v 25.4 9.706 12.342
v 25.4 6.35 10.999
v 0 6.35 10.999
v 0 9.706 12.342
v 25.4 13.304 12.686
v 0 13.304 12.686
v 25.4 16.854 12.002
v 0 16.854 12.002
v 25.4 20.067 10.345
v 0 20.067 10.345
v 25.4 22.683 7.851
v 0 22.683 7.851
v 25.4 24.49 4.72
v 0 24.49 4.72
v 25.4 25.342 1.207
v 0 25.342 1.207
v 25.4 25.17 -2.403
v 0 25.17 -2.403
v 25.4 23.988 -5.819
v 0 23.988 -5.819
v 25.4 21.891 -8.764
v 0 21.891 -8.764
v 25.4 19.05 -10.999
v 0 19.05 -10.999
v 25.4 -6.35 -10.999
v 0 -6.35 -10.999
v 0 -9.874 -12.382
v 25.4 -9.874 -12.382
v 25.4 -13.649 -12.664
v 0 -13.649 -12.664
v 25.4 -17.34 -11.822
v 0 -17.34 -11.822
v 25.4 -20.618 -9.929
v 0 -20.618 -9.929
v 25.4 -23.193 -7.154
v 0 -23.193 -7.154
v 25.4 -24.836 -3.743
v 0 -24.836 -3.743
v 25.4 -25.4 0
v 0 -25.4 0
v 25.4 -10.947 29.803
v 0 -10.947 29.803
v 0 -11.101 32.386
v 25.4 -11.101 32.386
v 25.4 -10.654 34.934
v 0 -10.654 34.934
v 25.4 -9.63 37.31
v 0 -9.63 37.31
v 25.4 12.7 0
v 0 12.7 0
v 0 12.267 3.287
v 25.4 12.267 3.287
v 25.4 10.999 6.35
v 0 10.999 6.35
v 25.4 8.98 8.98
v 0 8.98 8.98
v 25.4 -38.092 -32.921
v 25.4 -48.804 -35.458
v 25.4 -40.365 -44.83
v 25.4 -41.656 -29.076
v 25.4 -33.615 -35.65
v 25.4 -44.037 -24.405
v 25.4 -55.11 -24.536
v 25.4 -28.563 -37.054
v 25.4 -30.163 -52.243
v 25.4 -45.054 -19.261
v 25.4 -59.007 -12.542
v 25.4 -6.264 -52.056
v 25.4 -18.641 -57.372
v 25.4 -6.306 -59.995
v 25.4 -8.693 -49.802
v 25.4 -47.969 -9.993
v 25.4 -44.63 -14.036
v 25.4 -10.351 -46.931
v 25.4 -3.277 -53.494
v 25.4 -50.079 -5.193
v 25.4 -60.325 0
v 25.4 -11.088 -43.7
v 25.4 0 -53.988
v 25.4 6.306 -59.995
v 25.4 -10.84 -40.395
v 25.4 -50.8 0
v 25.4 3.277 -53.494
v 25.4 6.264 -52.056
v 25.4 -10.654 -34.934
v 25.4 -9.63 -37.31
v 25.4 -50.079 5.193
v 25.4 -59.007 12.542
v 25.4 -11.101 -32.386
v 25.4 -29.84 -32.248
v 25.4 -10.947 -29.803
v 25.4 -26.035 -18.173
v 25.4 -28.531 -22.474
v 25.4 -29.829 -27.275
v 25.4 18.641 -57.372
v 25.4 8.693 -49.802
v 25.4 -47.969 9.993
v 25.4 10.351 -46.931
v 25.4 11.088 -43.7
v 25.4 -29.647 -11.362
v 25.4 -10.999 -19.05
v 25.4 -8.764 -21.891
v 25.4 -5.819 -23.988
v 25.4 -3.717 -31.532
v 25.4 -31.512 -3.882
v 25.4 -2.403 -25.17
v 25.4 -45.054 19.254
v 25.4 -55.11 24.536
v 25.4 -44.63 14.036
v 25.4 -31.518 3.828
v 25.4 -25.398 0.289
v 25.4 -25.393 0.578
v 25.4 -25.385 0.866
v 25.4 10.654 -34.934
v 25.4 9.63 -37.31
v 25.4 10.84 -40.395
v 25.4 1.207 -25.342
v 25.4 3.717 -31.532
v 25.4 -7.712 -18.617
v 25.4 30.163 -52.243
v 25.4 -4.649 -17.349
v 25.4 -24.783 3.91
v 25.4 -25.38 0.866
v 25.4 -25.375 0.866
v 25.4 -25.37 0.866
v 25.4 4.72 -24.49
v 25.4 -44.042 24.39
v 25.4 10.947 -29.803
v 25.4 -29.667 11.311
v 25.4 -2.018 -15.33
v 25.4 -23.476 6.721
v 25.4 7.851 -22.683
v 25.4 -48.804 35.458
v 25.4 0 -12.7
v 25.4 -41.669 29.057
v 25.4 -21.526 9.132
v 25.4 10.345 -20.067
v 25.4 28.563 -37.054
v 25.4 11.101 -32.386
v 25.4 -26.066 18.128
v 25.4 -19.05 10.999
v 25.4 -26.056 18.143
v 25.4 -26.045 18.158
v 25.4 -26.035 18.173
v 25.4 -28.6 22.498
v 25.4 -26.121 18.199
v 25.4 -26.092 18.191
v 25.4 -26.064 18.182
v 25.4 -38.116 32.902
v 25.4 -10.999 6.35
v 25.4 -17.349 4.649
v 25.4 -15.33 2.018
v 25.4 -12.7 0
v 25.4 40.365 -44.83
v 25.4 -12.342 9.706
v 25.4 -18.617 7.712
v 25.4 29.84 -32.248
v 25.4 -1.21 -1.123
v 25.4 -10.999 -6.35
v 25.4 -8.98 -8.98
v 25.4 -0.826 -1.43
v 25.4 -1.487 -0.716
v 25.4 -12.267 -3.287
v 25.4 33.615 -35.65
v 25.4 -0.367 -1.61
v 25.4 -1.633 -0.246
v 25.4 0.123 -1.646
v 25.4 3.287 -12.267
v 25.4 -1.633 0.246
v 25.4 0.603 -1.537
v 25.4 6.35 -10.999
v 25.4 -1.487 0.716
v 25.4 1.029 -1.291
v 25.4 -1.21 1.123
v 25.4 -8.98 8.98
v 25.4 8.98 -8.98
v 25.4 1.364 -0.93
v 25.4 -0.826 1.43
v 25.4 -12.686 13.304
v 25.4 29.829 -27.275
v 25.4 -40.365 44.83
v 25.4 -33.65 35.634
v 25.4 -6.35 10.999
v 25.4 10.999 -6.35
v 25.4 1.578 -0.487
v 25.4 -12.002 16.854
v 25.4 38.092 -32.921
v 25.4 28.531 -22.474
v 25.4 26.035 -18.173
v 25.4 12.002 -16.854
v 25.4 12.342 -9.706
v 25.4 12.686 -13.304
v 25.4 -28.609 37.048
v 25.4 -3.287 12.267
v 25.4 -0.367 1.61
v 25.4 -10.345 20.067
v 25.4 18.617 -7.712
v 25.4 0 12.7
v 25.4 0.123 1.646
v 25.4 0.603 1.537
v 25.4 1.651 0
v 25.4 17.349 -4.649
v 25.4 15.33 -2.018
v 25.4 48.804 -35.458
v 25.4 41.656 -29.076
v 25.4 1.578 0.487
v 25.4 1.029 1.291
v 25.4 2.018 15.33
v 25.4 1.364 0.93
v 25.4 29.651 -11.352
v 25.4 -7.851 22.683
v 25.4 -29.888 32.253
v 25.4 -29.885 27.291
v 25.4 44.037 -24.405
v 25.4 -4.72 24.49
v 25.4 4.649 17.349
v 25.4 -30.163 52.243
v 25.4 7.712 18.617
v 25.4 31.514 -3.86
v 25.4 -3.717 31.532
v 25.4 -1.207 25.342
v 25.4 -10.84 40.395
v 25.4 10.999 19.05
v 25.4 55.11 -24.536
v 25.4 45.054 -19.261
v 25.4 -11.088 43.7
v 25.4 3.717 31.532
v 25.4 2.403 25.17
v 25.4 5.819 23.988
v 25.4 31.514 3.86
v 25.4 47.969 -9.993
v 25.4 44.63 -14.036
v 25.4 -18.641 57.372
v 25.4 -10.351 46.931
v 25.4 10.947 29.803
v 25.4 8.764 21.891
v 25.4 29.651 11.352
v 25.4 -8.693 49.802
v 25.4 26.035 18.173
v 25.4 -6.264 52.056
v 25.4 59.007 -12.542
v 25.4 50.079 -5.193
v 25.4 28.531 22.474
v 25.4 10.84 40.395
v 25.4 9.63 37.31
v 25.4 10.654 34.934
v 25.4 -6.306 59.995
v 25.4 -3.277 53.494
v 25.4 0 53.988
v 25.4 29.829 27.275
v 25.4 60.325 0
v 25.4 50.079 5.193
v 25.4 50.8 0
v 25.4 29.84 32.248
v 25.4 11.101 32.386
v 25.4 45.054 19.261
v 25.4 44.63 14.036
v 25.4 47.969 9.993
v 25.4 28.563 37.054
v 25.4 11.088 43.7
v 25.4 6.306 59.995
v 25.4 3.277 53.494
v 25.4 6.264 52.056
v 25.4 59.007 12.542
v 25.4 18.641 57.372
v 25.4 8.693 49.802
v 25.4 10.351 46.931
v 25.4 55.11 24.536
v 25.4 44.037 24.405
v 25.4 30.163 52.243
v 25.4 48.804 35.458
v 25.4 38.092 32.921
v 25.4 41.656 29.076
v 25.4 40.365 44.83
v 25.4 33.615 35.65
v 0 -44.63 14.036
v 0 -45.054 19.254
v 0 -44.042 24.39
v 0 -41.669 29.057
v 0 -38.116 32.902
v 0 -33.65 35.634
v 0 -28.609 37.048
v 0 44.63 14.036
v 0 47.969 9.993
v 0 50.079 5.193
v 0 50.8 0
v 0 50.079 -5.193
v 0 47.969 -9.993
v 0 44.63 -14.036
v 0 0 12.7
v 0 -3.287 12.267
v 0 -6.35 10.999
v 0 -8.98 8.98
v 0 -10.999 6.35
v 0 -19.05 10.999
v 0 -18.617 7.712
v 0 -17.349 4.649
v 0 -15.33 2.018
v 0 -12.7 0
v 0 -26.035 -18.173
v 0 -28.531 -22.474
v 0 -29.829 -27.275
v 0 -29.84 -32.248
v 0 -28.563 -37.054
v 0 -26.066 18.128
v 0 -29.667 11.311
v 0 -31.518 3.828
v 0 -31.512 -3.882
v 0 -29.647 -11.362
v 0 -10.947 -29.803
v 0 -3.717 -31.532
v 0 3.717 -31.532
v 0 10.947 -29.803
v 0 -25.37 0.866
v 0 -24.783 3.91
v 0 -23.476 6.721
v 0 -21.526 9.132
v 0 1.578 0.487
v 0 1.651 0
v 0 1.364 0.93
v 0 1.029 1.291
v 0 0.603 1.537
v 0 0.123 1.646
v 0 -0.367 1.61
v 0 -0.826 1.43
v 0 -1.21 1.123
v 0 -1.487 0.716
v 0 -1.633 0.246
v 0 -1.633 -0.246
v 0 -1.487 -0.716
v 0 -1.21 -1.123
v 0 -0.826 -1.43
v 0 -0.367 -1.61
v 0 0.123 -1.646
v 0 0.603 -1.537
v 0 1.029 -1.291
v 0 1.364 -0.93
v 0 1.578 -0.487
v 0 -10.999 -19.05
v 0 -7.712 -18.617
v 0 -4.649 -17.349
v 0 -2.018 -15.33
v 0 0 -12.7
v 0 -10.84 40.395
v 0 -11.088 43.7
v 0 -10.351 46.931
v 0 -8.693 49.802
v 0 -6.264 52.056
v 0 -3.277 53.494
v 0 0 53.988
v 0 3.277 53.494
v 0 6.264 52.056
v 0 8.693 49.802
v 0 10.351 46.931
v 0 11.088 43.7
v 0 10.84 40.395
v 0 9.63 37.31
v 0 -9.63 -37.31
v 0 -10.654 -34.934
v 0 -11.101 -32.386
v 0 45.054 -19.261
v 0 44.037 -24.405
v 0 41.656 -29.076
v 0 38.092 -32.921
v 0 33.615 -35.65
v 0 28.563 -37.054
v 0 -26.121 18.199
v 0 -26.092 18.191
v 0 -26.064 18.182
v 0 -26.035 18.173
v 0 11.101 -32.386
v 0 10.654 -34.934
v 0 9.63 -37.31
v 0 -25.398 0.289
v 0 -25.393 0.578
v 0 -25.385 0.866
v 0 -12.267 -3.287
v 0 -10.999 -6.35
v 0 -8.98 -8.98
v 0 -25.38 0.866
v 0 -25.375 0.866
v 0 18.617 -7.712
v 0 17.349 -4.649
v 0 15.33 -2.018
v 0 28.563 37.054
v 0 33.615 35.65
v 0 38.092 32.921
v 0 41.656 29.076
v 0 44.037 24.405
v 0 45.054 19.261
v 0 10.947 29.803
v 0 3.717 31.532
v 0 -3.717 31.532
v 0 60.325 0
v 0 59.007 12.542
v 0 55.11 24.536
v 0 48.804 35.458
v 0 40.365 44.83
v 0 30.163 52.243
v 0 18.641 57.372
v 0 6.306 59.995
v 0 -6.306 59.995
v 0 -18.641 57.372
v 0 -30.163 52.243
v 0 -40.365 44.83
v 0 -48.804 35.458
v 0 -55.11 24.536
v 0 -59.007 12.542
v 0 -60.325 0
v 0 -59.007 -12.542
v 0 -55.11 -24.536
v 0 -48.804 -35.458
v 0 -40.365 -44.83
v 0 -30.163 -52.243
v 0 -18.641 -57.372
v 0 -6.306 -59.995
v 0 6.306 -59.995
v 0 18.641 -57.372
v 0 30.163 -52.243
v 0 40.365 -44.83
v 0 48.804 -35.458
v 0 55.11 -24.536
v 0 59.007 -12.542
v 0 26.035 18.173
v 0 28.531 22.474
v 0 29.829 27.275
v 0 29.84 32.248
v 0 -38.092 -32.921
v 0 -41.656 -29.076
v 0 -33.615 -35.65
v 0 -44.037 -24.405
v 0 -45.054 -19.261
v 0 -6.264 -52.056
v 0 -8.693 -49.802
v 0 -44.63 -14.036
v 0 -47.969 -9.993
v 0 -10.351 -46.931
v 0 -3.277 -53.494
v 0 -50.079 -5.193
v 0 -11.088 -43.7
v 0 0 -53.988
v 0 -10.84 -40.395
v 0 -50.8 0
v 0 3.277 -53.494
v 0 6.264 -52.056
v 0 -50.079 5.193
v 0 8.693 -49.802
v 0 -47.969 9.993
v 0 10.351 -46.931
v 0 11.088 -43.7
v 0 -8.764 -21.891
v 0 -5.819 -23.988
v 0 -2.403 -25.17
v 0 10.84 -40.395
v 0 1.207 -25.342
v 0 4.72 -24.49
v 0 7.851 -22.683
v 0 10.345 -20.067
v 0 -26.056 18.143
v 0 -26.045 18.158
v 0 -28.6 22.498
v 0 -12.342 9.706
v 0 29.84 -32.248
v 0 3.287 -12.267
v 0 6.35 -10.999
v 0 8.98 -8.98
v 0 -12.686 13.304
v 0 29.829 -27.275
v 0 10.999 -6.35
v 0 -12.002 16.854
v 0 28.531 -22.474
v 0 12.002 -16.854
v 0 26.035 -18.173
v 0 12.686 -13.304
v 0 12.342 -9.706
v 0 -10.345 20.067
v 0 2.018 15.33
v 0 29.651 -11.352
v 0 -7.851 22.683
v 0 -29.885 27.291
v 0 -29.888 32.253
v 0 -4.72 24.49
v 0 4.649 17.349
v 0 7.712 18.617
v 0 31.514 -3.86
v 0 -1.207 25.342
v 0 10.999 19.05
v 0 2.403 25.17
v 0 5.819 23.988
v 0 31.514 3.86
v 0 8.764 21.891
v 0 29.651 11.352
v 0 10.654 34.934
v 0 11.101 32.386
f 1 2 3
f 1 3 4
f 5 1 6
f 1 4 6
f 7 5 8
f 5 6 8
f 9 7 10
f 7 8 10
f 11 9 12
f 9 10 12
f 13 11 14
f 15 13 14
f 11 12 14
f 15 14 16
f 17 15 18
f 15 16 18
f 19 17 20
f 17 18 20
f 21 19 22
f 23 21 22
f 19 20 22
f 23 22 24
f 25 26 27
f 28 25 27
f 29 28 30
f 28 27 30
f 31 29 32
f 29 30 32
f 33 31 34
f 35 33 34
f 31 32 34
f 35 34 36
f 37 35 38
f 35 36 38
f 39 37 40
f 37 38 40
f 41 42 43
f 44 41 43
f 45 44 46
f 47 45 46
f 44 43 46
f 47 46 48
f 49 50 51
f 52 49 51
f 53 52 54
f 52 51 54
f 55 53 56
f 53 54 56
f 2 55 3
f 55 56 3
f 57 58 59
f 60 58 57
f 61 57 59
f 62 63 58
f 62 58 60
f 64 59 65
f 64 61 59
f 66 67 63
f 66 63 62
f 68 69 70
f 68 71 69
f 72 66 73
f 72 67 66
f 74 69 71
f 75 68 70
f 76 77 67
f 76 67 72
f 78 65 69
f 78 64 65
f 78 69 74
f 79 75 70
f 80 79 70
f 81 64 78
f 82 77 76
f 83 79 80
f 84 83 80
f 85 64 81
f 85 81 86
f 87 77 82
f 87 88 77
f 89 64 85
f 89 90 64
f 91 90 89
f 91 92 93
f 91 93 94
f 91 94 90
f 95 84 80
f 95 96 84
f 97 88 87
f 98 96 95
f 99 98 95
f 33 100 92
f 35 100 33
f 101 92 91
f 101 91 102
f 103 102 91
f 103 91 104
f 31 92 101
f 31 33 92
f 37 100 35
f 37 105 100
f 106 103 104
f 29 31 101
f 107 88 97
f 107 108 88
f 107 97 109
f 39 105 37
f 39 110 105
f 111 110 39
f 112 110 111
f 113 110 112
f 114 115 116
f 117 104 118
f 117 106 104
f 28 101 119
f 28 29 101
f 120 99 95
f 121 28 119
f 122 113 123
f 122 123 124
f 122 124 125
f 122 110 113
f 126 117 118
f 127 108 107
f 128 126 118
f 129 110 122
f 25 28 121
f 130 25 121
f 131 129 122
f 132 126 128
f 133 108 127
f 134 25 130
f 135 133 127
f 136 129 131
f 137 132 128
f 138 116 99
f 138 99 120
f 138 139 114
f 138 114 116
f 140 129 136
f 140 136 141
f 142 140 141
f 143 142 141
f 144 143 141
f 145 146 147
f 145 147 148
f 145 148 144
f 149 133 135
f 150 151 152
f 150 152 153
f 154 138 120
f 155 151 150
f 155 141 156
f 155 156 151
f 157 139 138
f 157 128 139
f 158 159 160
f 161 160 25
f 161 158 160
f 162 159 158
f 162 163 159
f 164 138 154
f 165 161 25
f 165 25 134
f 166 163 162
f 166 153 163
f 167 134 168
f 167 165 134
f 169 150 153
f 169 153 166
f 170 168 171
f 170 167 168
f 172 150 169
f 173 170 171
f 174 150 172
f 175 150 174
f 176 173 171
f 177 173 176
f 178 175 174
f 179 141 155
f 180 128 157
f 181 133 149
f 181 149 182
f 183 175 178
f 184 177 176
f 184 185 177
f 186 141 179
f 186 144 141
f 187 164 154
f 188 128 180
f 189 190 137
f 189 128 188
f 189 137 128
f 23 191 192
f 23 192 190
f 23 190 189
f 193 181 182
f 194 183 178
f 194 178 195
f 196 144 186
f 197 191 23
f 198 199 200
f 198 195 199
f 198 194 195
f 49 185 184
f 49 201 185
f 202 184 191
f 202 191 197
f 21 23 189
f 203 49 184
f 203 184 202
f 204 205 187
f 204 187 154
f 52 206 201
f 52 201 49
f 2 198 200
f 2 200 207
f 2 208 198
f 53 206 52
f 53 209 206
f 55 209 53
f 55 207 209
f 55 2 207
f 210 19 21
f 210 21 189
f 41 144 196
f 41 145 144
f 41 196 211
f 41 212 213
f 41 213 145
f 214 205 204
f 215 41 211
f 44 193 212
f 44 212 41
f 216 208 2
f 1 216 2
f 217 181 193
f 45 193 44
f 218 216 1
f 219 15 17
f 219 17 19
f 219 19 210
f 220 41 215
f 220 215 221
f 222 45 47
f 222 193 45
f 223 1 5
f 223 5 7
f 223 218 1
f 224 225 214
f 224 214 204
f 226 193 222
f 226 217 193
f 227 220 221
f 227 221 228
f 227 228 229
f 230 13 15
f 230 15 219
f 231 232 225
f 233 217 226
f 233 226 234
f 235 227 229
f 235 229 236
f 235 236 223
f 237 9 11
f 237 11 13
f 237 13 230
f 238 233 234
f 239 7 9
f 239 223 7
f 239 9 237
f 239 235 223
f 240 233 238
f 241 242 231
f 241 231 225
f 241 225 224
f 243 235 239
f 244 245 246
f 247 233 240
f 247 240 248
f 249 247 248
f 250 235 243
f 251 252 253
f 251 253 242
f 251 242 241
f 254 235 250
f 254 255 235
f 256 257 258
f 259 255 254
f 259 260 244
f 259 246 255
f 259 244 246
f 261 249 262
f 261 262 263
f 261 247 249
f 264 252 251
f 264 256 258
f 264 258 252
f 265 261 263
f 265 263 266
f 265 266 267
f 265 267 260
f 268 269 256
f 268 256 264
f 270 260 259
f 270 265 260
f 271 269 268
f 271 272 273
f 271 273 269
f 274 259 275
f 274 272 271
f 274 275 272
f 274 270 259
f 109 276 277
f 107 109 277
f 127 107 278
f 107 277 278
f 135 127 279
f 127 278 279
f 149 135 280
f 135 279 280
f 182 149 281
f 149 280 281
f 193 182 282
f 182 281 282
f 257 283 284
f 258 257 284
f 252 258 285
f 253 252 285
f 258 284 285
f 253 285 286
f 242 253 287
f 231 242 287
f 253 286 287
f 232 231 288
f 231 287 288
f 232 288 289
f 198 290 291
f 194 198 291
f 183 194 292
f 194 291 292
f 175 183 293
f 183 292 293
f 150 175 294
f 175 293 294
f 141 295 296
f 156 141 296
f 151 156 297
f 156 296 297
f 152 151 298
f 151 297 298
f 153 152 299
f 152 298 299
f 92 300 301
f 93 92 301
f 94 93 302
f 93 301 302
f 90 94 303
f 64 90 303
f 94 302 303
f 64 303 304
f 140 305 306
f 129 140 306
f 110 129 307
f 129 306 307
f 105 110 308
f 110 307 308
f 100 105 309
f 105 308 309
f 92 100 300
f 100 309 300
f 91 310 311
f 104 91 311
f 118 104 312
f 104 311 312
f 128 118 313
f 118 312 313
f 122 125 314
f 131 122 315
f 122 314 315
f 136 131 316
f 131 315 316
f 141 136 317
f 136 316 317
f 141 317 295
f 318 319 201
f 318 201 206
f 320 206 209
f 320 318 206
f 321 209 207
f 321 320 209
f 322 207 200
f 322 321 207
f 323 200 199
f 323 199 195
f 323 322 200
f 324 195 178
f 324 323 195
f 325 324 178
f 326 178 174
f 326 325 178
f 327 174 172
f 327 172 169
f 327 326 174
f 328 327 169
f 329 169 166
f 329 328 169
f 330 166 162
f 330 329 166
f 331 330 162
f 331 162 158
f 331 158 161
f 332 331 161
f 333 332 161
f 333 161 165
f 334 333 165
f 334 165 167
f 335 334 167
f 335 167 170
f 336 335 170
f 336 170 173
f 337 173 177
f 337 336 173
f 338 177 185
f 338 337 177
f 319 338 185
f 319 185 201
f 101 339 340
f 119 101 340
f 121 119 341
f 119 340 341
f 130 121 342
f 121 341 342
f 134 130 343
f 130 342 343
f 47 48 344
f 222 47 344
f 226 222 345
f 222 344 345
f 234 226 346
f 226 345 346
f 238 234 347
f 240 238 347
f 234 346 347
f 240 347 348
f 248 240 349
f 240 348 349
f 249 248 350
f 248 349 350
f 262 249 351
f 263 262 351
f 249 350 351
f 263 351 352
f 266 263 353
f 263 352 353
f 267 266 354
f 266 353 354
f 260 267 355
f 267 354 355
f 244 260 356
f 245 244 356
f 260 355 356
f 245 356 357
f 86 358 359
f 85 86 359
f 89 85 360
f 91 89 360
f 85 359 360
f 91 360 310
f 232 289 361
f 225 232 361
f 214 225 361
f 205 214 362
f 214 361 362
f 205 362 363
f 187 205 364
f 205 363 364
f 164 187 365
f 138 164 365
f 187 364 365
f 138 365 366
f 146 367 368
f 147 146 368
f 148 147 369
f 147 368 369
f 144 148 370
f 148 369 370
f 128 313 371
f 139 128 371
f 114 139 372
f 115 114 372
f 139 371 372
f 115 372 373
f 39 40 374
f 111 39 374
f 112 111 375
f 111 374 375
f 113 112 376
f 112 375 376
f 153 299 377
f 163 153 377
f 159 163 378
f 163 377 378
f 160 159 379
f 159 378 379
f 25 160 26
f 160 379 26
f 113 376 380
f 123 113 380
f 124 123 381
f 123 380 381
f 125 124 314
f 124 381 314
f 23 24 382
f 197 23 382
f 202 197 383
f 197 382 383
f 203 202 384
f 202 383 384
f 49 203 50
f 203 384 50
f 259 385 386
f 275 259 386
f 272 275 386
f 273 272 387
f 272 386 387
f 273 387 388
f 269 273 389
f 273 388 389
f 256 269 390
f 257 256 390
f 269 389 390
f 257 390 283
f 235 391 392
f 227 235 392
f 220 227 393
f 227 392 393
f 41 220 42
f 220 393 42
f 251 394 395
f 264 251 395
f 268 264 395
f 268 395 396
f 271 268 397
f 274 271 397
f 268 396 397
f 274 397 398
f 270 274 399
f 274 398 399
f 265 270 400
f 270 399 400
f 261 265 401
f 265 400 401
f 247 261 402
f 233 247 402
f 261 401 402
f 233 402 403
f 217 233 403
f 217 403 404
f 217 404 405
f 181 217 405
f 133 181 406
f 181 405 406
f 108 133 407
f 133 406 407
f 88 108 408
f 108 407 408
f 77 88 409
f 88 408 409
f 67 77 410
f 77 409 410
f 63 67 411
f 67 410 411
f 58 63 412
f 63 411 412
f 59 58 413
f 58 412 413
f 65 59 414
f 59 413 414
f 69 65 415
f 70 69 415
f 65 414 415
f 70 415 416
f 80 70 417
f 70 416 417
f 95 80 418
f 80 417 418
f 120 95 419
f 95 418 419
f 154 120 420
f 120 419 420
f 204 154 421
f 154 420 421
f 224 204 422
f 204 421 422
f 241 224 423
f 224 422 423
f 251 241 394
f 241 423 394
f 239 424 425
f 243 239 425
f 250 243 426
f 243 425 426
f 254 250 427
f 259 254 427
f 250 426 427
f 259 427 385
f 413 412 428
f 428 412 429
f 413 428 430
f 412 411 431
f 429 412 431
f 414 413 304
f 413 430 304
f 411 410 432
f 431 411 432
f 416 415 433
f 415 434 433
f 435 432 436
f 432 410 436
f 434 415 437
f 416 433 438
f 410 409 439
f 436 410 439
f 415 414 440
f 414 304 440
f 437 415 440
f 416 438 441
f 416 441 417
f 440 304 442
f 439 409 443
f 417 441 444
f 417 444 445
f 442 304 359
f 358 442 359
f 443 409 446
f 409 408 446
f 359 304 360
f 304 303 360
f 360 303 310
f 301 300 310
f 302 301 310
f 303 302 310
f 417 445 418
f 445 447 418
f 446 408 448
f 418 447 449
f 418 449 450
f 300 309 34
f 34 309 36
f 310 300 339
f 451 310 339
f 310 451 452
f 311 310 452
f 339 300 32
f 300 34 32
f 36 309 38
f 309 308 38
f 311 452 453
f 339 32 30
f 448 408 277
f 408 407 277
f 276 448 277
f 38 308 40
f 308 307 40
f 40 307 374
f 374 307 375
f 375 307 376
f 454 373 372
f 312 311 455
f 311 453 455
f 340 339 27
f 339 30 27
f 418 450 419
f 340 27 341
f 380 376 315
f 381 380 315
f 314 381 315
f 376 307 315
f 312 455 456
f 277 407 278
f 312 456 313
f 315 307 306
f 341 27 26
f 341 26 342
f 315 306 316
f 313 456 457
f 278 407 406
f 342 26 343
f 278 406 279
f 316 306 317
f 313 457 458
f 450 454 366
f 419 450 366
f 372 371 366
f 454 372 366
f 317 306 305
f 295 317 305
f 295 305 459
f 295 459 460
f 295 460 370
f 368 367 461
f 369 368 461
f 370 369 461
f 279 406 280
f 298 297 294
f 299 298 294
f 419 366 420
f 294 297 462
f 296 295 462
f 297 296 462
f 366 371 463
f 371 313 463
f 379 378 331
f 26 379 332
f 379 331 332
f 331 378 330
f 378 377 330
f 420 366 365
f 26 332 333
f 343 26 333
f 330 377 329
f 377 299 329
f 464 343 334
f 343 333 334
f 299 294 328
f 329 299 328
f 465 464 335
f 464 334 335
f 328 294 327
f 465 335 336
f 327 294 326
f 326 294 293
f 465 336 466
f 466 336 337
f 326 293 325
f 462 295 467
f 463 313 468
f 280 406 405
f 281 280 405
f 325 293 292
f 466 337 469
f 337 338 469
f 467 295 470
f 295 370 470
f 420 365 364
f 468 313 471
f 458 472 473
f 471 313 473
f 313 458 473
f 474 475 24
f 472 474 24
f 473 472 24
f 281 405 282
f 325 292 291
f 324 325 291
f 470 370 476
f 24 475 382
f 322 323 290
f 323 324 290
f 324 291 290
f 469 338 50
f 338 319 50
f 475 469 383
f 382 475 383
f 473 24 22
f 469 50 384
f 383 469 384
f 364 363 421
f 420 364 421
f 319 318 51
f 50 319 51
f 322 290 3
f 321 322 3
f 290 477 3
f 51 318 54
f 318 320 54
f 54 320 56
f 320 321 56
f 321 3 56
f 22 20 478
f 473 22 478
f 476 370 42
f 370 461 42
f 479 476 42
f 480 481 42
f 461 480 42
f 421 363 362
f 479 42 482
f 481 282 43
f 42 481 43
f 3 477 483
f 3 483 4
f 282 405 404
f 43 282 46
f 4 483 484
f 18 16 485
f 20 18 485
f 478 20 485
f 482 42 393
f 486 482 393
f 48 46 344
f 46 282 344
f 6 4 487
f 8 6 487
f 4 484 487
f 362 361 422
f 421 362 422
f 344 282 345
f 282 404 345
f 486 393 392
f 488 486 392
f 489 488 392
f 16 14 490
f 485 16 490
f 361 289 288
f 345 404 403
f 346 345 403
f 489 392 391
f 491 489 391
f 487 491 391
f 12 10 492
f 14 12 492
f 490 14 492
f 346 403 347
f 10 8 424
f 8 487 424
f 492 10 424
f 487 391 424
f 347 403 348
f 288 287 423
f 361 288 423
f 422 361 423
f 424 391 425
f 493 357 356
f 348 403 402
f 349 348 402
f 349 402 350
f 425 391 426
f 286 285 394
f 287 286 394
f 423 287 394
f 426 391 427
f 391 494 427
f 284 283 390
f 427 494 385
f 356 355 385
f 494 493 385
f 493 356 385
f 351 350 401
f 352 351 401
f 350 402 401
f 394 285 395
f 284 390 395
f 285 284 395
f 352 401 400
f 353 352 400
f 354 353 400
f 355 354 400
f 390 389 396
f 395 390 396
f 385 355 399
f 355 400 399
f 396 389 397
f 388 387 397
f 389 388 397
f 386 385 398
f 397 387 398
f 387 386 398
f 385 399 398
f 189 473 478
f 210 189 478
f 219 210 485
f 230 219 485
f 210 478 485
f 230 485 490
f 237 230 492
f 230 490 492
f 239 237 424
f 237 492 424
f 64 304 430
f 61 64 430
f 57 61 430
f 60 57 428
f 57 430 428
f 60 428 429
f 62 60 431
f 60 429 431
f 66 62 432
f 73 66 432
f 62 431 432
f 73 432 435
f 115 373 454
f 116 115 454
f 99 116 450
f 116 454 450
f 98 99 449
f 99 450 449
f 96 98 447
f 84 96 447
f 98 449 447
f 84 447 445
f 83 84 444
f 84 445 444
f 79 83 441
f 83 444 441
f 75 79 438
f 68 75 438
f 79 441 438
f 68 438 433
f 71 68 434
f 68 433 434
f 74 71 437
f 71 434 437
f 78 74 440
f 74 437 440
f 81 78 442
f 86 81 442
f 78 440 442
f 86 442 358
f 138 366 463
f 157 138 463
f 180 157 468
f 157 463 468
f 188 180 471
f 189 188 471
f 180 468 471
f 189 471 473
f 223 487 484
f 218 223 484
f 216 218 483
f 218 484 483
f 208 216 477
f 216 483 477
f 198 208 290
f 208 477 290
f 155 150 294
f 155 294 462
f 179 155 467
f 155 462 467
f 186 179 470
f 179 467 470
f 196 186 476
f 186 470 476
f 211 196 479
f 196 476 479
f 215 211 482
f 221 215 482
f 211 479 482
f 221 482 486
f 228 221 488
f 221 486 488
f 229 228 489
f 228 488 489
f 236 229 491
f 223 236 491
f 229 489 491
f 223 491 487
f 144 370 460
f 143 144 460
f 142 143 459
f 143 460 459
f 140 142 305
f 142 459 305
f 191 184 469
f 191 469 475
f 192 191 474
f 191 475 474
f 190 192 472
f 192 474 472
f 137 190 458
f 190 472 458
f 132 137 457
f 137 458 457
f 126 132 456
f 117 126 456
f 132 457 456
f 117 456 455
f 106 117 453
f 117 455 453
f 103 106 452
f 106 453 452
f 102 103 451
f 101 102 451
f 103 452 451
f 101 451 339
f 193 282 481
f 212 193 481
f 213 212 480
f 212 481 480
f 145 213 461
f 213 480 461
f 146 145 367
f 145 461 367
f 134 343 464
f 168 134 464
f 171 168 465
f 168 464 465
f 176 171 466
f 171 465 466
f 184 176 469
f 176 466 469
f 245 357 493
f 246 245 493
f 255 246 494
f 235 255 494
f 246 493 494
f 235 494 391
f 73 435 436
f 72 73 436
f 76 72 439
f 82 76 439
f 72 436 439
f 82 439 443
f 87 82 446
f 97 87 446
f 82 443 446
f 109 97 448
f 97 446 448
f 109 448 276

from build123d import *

# Parameters (mm, degrees)
F0_R     = 60.325
F0_R_2   = 1.651
F1_DEPTH = 25.4


# Not quite as in the source:
# - a feature names something its author has since deleted; it is built from what else it names


with BuildPart() as f1:
    # F0 (on Right) → F1 (new body)
    with BuildSketch(Plane.YZ):
        Circle(F0_R)
        with BuildLine():
            ThreePointArc((-44.6303828389, -14.0356060761), (-50.8, 0), (-44.6303828389, 14.0356060761))
            ThreePointArc((-44.6303828389, 14.0356060761), (-41.6692499302, 29.0570596505), (-28.609366898, 37.0477937078))
            ThreePointArc((-28.609366898, 37.0477937078), (-29.8846813864, 27.2910481481), (-26.1212663508, 18.1994466264))
            ThreePointArc((-26.1212663508, 18.1994466264), (-26.0781172223, 18.1860453578), (-26.035, 18.172541787))
            ThreePointArc((-26.035, 18.172541787), (-26.0505815045, 18.1501984364), (-26.0661438338, 18.1278417259))
            ThreePointArc((-26.0661438338, 18.1278417259), (-31.7499883148, -0.0272398323), (-26.035, -18.172541787))
            ThreePointArc((-26.035, -18.172541787), (-29.828858254, -27.2745235138), (-28.5634450169, -37.054000041))
            ThreePointArc((-28.5634450169, -37.054000041), (-41.656, -29.0760668592), (-44.6303828389, -14.0356060761))
        make_face(mode=Mode.SUBTRACT)
        with BuildLine():
            ThreePointArc((-19.05, 10.9985226281), (-17.3485226281, 4.6485226281), (-12.7, 0))
            ThreePointArc((-12.7, 0), (-10.9985226281, -6.35), (-6.35, -10.9985226281))
            ThreePointArc((-6.35, -10.9985226281), (-19.05, -10.9985226281), (-25.4, 0))
            ThreePointArc((-25.4, 0), (-25.3963047456, 0.4332496584), (-25.3852200578, 0.8663732563))
            ThreePointArc((-25.3852200578, 0.8663732563), (-25.3778345329, 0.8661197613), (-25.3704491069, 0.8658634012))
            ThreePointArc((-25.3704491069, 0.8658634012), (-23.4755309293, 6.7214532053), (-19.05, 10.9985226281))
        make_face(mode=Mode.SUBTRACT)
        with BuildLine():
            ThreePointArc((-9.6295053729, -37.3095975192), (-10.9516952283, -33.6727246106), (-10.9474, -29.8029685307))
            ThreePointArc((-10.9474, -29.8029685307), (0, -31.75), (10.9474, -29.8029685307))
            ThreePointArc((10.9474, -29.8029685307), (10.9516952283, -33.6727246106), (9.6295053729, -37.3095975192))
            ThreePointArc((9.6295053729, -37.3095975192), (0, -53.9883900769), (-9.6295053729, -37.3095975192))
        make_face(mode=Mode.SUBTRACT)
        with BuildLine():
            ThreePointArc((10.9985226281, -6.35), (6.35, -23.6985226281), (-10.9985226281, -19.05))
            ThreePointArc((-10.9985226281, -19.05), (-4.6485226281, -17.3485226281), (0, -12.7))
            ThreePointArc((0, -12.7), (6.35, -10.9985226281), (10.9985226281, -6.35))
        make_face(mode=Mode.SUBTRACT)
        with BuildLine():
            ThreePointArc((-10.9985226281, 6.35), (-6.35, 23.6985226281), (10.9985226281, 19.05))
            ThreePointArc((10.9985226281, 19.05), (4.6485226281, 17.3485226281), (0, 12.7))
            ThreePointArc((0, 12.7), (-6.35, 10.9985226281), (-10.9985226281, 6.35))
        make_face(mode=Mode.SUBTRACT)
        Circle(F0_R_2, mode=Mode.SUBTRACT)
        with BuildLine():
            ThreePointArc((6.35, 10.9985226281), (23.6985226281, 6.35), (19.05, -10.9985226281))
            ThreePointArc((19.05, -10.9985226281), (17.3485226281, -4.6485226281), (12.7, 0))
            ThreePointArc((12.7, 0), (10.9985226281, 6.35), (6.35, 10.9985226281))
        make_face(mode=Mode.SUBTRACT)
        with BuildLine():
            ThreePointArc((28.5634450169, -37.054000041), (29.828858254, -27.2745235138), (26.035, -18.172541787))
            ThreePointArc((26.035, -18.172541787), (31.75, 0), (26.035, 18.172541787))
            ThreePointArc((26.035, 18.172541787), (29.828858254, 27.2745235138), (28.5634450169, 37.054000041))
            ThreePointArc((28.5634450169, 37.054000041), (41.656, 29.0760668592), (44.6303828389, 14.0356060761))
            ThreePointArc((44.6303828389, 14.0356060761), (50.8, 0), (44.6303828389, -14.0356060761))
            ThreePointArc((44.6303828389, -14.0356060761), (41.656, -29.0760668592), (28.5634450169, -37.054000041))
        make_face(mode=Mode.SUBTRACT)
        with BuildLine():
            ThreePointArc((9.6295053729, 37.3095975192), (10.9516952283, 33.6727246106), (10.9474, 29.8029685307))
            ThreePointArc((10.9474, 29.8029685307), (0, 31.75), (-10.9474, 29.8029685307))
            ThreePointArc((-10.9474, 29.8029685307), (-10.9516952283, 33.6727246106), (-9.6295053729, 37.3095975192))
            ThreePointArc((-9.6295053729, 37.3095975192), (0, 53.9883900769), (9.6295053729, 37.3095975192))
        make_face(mode=Mode.SUBTRACT)
    extrude(amount=F1_DEPTH)


solid = f1.part
